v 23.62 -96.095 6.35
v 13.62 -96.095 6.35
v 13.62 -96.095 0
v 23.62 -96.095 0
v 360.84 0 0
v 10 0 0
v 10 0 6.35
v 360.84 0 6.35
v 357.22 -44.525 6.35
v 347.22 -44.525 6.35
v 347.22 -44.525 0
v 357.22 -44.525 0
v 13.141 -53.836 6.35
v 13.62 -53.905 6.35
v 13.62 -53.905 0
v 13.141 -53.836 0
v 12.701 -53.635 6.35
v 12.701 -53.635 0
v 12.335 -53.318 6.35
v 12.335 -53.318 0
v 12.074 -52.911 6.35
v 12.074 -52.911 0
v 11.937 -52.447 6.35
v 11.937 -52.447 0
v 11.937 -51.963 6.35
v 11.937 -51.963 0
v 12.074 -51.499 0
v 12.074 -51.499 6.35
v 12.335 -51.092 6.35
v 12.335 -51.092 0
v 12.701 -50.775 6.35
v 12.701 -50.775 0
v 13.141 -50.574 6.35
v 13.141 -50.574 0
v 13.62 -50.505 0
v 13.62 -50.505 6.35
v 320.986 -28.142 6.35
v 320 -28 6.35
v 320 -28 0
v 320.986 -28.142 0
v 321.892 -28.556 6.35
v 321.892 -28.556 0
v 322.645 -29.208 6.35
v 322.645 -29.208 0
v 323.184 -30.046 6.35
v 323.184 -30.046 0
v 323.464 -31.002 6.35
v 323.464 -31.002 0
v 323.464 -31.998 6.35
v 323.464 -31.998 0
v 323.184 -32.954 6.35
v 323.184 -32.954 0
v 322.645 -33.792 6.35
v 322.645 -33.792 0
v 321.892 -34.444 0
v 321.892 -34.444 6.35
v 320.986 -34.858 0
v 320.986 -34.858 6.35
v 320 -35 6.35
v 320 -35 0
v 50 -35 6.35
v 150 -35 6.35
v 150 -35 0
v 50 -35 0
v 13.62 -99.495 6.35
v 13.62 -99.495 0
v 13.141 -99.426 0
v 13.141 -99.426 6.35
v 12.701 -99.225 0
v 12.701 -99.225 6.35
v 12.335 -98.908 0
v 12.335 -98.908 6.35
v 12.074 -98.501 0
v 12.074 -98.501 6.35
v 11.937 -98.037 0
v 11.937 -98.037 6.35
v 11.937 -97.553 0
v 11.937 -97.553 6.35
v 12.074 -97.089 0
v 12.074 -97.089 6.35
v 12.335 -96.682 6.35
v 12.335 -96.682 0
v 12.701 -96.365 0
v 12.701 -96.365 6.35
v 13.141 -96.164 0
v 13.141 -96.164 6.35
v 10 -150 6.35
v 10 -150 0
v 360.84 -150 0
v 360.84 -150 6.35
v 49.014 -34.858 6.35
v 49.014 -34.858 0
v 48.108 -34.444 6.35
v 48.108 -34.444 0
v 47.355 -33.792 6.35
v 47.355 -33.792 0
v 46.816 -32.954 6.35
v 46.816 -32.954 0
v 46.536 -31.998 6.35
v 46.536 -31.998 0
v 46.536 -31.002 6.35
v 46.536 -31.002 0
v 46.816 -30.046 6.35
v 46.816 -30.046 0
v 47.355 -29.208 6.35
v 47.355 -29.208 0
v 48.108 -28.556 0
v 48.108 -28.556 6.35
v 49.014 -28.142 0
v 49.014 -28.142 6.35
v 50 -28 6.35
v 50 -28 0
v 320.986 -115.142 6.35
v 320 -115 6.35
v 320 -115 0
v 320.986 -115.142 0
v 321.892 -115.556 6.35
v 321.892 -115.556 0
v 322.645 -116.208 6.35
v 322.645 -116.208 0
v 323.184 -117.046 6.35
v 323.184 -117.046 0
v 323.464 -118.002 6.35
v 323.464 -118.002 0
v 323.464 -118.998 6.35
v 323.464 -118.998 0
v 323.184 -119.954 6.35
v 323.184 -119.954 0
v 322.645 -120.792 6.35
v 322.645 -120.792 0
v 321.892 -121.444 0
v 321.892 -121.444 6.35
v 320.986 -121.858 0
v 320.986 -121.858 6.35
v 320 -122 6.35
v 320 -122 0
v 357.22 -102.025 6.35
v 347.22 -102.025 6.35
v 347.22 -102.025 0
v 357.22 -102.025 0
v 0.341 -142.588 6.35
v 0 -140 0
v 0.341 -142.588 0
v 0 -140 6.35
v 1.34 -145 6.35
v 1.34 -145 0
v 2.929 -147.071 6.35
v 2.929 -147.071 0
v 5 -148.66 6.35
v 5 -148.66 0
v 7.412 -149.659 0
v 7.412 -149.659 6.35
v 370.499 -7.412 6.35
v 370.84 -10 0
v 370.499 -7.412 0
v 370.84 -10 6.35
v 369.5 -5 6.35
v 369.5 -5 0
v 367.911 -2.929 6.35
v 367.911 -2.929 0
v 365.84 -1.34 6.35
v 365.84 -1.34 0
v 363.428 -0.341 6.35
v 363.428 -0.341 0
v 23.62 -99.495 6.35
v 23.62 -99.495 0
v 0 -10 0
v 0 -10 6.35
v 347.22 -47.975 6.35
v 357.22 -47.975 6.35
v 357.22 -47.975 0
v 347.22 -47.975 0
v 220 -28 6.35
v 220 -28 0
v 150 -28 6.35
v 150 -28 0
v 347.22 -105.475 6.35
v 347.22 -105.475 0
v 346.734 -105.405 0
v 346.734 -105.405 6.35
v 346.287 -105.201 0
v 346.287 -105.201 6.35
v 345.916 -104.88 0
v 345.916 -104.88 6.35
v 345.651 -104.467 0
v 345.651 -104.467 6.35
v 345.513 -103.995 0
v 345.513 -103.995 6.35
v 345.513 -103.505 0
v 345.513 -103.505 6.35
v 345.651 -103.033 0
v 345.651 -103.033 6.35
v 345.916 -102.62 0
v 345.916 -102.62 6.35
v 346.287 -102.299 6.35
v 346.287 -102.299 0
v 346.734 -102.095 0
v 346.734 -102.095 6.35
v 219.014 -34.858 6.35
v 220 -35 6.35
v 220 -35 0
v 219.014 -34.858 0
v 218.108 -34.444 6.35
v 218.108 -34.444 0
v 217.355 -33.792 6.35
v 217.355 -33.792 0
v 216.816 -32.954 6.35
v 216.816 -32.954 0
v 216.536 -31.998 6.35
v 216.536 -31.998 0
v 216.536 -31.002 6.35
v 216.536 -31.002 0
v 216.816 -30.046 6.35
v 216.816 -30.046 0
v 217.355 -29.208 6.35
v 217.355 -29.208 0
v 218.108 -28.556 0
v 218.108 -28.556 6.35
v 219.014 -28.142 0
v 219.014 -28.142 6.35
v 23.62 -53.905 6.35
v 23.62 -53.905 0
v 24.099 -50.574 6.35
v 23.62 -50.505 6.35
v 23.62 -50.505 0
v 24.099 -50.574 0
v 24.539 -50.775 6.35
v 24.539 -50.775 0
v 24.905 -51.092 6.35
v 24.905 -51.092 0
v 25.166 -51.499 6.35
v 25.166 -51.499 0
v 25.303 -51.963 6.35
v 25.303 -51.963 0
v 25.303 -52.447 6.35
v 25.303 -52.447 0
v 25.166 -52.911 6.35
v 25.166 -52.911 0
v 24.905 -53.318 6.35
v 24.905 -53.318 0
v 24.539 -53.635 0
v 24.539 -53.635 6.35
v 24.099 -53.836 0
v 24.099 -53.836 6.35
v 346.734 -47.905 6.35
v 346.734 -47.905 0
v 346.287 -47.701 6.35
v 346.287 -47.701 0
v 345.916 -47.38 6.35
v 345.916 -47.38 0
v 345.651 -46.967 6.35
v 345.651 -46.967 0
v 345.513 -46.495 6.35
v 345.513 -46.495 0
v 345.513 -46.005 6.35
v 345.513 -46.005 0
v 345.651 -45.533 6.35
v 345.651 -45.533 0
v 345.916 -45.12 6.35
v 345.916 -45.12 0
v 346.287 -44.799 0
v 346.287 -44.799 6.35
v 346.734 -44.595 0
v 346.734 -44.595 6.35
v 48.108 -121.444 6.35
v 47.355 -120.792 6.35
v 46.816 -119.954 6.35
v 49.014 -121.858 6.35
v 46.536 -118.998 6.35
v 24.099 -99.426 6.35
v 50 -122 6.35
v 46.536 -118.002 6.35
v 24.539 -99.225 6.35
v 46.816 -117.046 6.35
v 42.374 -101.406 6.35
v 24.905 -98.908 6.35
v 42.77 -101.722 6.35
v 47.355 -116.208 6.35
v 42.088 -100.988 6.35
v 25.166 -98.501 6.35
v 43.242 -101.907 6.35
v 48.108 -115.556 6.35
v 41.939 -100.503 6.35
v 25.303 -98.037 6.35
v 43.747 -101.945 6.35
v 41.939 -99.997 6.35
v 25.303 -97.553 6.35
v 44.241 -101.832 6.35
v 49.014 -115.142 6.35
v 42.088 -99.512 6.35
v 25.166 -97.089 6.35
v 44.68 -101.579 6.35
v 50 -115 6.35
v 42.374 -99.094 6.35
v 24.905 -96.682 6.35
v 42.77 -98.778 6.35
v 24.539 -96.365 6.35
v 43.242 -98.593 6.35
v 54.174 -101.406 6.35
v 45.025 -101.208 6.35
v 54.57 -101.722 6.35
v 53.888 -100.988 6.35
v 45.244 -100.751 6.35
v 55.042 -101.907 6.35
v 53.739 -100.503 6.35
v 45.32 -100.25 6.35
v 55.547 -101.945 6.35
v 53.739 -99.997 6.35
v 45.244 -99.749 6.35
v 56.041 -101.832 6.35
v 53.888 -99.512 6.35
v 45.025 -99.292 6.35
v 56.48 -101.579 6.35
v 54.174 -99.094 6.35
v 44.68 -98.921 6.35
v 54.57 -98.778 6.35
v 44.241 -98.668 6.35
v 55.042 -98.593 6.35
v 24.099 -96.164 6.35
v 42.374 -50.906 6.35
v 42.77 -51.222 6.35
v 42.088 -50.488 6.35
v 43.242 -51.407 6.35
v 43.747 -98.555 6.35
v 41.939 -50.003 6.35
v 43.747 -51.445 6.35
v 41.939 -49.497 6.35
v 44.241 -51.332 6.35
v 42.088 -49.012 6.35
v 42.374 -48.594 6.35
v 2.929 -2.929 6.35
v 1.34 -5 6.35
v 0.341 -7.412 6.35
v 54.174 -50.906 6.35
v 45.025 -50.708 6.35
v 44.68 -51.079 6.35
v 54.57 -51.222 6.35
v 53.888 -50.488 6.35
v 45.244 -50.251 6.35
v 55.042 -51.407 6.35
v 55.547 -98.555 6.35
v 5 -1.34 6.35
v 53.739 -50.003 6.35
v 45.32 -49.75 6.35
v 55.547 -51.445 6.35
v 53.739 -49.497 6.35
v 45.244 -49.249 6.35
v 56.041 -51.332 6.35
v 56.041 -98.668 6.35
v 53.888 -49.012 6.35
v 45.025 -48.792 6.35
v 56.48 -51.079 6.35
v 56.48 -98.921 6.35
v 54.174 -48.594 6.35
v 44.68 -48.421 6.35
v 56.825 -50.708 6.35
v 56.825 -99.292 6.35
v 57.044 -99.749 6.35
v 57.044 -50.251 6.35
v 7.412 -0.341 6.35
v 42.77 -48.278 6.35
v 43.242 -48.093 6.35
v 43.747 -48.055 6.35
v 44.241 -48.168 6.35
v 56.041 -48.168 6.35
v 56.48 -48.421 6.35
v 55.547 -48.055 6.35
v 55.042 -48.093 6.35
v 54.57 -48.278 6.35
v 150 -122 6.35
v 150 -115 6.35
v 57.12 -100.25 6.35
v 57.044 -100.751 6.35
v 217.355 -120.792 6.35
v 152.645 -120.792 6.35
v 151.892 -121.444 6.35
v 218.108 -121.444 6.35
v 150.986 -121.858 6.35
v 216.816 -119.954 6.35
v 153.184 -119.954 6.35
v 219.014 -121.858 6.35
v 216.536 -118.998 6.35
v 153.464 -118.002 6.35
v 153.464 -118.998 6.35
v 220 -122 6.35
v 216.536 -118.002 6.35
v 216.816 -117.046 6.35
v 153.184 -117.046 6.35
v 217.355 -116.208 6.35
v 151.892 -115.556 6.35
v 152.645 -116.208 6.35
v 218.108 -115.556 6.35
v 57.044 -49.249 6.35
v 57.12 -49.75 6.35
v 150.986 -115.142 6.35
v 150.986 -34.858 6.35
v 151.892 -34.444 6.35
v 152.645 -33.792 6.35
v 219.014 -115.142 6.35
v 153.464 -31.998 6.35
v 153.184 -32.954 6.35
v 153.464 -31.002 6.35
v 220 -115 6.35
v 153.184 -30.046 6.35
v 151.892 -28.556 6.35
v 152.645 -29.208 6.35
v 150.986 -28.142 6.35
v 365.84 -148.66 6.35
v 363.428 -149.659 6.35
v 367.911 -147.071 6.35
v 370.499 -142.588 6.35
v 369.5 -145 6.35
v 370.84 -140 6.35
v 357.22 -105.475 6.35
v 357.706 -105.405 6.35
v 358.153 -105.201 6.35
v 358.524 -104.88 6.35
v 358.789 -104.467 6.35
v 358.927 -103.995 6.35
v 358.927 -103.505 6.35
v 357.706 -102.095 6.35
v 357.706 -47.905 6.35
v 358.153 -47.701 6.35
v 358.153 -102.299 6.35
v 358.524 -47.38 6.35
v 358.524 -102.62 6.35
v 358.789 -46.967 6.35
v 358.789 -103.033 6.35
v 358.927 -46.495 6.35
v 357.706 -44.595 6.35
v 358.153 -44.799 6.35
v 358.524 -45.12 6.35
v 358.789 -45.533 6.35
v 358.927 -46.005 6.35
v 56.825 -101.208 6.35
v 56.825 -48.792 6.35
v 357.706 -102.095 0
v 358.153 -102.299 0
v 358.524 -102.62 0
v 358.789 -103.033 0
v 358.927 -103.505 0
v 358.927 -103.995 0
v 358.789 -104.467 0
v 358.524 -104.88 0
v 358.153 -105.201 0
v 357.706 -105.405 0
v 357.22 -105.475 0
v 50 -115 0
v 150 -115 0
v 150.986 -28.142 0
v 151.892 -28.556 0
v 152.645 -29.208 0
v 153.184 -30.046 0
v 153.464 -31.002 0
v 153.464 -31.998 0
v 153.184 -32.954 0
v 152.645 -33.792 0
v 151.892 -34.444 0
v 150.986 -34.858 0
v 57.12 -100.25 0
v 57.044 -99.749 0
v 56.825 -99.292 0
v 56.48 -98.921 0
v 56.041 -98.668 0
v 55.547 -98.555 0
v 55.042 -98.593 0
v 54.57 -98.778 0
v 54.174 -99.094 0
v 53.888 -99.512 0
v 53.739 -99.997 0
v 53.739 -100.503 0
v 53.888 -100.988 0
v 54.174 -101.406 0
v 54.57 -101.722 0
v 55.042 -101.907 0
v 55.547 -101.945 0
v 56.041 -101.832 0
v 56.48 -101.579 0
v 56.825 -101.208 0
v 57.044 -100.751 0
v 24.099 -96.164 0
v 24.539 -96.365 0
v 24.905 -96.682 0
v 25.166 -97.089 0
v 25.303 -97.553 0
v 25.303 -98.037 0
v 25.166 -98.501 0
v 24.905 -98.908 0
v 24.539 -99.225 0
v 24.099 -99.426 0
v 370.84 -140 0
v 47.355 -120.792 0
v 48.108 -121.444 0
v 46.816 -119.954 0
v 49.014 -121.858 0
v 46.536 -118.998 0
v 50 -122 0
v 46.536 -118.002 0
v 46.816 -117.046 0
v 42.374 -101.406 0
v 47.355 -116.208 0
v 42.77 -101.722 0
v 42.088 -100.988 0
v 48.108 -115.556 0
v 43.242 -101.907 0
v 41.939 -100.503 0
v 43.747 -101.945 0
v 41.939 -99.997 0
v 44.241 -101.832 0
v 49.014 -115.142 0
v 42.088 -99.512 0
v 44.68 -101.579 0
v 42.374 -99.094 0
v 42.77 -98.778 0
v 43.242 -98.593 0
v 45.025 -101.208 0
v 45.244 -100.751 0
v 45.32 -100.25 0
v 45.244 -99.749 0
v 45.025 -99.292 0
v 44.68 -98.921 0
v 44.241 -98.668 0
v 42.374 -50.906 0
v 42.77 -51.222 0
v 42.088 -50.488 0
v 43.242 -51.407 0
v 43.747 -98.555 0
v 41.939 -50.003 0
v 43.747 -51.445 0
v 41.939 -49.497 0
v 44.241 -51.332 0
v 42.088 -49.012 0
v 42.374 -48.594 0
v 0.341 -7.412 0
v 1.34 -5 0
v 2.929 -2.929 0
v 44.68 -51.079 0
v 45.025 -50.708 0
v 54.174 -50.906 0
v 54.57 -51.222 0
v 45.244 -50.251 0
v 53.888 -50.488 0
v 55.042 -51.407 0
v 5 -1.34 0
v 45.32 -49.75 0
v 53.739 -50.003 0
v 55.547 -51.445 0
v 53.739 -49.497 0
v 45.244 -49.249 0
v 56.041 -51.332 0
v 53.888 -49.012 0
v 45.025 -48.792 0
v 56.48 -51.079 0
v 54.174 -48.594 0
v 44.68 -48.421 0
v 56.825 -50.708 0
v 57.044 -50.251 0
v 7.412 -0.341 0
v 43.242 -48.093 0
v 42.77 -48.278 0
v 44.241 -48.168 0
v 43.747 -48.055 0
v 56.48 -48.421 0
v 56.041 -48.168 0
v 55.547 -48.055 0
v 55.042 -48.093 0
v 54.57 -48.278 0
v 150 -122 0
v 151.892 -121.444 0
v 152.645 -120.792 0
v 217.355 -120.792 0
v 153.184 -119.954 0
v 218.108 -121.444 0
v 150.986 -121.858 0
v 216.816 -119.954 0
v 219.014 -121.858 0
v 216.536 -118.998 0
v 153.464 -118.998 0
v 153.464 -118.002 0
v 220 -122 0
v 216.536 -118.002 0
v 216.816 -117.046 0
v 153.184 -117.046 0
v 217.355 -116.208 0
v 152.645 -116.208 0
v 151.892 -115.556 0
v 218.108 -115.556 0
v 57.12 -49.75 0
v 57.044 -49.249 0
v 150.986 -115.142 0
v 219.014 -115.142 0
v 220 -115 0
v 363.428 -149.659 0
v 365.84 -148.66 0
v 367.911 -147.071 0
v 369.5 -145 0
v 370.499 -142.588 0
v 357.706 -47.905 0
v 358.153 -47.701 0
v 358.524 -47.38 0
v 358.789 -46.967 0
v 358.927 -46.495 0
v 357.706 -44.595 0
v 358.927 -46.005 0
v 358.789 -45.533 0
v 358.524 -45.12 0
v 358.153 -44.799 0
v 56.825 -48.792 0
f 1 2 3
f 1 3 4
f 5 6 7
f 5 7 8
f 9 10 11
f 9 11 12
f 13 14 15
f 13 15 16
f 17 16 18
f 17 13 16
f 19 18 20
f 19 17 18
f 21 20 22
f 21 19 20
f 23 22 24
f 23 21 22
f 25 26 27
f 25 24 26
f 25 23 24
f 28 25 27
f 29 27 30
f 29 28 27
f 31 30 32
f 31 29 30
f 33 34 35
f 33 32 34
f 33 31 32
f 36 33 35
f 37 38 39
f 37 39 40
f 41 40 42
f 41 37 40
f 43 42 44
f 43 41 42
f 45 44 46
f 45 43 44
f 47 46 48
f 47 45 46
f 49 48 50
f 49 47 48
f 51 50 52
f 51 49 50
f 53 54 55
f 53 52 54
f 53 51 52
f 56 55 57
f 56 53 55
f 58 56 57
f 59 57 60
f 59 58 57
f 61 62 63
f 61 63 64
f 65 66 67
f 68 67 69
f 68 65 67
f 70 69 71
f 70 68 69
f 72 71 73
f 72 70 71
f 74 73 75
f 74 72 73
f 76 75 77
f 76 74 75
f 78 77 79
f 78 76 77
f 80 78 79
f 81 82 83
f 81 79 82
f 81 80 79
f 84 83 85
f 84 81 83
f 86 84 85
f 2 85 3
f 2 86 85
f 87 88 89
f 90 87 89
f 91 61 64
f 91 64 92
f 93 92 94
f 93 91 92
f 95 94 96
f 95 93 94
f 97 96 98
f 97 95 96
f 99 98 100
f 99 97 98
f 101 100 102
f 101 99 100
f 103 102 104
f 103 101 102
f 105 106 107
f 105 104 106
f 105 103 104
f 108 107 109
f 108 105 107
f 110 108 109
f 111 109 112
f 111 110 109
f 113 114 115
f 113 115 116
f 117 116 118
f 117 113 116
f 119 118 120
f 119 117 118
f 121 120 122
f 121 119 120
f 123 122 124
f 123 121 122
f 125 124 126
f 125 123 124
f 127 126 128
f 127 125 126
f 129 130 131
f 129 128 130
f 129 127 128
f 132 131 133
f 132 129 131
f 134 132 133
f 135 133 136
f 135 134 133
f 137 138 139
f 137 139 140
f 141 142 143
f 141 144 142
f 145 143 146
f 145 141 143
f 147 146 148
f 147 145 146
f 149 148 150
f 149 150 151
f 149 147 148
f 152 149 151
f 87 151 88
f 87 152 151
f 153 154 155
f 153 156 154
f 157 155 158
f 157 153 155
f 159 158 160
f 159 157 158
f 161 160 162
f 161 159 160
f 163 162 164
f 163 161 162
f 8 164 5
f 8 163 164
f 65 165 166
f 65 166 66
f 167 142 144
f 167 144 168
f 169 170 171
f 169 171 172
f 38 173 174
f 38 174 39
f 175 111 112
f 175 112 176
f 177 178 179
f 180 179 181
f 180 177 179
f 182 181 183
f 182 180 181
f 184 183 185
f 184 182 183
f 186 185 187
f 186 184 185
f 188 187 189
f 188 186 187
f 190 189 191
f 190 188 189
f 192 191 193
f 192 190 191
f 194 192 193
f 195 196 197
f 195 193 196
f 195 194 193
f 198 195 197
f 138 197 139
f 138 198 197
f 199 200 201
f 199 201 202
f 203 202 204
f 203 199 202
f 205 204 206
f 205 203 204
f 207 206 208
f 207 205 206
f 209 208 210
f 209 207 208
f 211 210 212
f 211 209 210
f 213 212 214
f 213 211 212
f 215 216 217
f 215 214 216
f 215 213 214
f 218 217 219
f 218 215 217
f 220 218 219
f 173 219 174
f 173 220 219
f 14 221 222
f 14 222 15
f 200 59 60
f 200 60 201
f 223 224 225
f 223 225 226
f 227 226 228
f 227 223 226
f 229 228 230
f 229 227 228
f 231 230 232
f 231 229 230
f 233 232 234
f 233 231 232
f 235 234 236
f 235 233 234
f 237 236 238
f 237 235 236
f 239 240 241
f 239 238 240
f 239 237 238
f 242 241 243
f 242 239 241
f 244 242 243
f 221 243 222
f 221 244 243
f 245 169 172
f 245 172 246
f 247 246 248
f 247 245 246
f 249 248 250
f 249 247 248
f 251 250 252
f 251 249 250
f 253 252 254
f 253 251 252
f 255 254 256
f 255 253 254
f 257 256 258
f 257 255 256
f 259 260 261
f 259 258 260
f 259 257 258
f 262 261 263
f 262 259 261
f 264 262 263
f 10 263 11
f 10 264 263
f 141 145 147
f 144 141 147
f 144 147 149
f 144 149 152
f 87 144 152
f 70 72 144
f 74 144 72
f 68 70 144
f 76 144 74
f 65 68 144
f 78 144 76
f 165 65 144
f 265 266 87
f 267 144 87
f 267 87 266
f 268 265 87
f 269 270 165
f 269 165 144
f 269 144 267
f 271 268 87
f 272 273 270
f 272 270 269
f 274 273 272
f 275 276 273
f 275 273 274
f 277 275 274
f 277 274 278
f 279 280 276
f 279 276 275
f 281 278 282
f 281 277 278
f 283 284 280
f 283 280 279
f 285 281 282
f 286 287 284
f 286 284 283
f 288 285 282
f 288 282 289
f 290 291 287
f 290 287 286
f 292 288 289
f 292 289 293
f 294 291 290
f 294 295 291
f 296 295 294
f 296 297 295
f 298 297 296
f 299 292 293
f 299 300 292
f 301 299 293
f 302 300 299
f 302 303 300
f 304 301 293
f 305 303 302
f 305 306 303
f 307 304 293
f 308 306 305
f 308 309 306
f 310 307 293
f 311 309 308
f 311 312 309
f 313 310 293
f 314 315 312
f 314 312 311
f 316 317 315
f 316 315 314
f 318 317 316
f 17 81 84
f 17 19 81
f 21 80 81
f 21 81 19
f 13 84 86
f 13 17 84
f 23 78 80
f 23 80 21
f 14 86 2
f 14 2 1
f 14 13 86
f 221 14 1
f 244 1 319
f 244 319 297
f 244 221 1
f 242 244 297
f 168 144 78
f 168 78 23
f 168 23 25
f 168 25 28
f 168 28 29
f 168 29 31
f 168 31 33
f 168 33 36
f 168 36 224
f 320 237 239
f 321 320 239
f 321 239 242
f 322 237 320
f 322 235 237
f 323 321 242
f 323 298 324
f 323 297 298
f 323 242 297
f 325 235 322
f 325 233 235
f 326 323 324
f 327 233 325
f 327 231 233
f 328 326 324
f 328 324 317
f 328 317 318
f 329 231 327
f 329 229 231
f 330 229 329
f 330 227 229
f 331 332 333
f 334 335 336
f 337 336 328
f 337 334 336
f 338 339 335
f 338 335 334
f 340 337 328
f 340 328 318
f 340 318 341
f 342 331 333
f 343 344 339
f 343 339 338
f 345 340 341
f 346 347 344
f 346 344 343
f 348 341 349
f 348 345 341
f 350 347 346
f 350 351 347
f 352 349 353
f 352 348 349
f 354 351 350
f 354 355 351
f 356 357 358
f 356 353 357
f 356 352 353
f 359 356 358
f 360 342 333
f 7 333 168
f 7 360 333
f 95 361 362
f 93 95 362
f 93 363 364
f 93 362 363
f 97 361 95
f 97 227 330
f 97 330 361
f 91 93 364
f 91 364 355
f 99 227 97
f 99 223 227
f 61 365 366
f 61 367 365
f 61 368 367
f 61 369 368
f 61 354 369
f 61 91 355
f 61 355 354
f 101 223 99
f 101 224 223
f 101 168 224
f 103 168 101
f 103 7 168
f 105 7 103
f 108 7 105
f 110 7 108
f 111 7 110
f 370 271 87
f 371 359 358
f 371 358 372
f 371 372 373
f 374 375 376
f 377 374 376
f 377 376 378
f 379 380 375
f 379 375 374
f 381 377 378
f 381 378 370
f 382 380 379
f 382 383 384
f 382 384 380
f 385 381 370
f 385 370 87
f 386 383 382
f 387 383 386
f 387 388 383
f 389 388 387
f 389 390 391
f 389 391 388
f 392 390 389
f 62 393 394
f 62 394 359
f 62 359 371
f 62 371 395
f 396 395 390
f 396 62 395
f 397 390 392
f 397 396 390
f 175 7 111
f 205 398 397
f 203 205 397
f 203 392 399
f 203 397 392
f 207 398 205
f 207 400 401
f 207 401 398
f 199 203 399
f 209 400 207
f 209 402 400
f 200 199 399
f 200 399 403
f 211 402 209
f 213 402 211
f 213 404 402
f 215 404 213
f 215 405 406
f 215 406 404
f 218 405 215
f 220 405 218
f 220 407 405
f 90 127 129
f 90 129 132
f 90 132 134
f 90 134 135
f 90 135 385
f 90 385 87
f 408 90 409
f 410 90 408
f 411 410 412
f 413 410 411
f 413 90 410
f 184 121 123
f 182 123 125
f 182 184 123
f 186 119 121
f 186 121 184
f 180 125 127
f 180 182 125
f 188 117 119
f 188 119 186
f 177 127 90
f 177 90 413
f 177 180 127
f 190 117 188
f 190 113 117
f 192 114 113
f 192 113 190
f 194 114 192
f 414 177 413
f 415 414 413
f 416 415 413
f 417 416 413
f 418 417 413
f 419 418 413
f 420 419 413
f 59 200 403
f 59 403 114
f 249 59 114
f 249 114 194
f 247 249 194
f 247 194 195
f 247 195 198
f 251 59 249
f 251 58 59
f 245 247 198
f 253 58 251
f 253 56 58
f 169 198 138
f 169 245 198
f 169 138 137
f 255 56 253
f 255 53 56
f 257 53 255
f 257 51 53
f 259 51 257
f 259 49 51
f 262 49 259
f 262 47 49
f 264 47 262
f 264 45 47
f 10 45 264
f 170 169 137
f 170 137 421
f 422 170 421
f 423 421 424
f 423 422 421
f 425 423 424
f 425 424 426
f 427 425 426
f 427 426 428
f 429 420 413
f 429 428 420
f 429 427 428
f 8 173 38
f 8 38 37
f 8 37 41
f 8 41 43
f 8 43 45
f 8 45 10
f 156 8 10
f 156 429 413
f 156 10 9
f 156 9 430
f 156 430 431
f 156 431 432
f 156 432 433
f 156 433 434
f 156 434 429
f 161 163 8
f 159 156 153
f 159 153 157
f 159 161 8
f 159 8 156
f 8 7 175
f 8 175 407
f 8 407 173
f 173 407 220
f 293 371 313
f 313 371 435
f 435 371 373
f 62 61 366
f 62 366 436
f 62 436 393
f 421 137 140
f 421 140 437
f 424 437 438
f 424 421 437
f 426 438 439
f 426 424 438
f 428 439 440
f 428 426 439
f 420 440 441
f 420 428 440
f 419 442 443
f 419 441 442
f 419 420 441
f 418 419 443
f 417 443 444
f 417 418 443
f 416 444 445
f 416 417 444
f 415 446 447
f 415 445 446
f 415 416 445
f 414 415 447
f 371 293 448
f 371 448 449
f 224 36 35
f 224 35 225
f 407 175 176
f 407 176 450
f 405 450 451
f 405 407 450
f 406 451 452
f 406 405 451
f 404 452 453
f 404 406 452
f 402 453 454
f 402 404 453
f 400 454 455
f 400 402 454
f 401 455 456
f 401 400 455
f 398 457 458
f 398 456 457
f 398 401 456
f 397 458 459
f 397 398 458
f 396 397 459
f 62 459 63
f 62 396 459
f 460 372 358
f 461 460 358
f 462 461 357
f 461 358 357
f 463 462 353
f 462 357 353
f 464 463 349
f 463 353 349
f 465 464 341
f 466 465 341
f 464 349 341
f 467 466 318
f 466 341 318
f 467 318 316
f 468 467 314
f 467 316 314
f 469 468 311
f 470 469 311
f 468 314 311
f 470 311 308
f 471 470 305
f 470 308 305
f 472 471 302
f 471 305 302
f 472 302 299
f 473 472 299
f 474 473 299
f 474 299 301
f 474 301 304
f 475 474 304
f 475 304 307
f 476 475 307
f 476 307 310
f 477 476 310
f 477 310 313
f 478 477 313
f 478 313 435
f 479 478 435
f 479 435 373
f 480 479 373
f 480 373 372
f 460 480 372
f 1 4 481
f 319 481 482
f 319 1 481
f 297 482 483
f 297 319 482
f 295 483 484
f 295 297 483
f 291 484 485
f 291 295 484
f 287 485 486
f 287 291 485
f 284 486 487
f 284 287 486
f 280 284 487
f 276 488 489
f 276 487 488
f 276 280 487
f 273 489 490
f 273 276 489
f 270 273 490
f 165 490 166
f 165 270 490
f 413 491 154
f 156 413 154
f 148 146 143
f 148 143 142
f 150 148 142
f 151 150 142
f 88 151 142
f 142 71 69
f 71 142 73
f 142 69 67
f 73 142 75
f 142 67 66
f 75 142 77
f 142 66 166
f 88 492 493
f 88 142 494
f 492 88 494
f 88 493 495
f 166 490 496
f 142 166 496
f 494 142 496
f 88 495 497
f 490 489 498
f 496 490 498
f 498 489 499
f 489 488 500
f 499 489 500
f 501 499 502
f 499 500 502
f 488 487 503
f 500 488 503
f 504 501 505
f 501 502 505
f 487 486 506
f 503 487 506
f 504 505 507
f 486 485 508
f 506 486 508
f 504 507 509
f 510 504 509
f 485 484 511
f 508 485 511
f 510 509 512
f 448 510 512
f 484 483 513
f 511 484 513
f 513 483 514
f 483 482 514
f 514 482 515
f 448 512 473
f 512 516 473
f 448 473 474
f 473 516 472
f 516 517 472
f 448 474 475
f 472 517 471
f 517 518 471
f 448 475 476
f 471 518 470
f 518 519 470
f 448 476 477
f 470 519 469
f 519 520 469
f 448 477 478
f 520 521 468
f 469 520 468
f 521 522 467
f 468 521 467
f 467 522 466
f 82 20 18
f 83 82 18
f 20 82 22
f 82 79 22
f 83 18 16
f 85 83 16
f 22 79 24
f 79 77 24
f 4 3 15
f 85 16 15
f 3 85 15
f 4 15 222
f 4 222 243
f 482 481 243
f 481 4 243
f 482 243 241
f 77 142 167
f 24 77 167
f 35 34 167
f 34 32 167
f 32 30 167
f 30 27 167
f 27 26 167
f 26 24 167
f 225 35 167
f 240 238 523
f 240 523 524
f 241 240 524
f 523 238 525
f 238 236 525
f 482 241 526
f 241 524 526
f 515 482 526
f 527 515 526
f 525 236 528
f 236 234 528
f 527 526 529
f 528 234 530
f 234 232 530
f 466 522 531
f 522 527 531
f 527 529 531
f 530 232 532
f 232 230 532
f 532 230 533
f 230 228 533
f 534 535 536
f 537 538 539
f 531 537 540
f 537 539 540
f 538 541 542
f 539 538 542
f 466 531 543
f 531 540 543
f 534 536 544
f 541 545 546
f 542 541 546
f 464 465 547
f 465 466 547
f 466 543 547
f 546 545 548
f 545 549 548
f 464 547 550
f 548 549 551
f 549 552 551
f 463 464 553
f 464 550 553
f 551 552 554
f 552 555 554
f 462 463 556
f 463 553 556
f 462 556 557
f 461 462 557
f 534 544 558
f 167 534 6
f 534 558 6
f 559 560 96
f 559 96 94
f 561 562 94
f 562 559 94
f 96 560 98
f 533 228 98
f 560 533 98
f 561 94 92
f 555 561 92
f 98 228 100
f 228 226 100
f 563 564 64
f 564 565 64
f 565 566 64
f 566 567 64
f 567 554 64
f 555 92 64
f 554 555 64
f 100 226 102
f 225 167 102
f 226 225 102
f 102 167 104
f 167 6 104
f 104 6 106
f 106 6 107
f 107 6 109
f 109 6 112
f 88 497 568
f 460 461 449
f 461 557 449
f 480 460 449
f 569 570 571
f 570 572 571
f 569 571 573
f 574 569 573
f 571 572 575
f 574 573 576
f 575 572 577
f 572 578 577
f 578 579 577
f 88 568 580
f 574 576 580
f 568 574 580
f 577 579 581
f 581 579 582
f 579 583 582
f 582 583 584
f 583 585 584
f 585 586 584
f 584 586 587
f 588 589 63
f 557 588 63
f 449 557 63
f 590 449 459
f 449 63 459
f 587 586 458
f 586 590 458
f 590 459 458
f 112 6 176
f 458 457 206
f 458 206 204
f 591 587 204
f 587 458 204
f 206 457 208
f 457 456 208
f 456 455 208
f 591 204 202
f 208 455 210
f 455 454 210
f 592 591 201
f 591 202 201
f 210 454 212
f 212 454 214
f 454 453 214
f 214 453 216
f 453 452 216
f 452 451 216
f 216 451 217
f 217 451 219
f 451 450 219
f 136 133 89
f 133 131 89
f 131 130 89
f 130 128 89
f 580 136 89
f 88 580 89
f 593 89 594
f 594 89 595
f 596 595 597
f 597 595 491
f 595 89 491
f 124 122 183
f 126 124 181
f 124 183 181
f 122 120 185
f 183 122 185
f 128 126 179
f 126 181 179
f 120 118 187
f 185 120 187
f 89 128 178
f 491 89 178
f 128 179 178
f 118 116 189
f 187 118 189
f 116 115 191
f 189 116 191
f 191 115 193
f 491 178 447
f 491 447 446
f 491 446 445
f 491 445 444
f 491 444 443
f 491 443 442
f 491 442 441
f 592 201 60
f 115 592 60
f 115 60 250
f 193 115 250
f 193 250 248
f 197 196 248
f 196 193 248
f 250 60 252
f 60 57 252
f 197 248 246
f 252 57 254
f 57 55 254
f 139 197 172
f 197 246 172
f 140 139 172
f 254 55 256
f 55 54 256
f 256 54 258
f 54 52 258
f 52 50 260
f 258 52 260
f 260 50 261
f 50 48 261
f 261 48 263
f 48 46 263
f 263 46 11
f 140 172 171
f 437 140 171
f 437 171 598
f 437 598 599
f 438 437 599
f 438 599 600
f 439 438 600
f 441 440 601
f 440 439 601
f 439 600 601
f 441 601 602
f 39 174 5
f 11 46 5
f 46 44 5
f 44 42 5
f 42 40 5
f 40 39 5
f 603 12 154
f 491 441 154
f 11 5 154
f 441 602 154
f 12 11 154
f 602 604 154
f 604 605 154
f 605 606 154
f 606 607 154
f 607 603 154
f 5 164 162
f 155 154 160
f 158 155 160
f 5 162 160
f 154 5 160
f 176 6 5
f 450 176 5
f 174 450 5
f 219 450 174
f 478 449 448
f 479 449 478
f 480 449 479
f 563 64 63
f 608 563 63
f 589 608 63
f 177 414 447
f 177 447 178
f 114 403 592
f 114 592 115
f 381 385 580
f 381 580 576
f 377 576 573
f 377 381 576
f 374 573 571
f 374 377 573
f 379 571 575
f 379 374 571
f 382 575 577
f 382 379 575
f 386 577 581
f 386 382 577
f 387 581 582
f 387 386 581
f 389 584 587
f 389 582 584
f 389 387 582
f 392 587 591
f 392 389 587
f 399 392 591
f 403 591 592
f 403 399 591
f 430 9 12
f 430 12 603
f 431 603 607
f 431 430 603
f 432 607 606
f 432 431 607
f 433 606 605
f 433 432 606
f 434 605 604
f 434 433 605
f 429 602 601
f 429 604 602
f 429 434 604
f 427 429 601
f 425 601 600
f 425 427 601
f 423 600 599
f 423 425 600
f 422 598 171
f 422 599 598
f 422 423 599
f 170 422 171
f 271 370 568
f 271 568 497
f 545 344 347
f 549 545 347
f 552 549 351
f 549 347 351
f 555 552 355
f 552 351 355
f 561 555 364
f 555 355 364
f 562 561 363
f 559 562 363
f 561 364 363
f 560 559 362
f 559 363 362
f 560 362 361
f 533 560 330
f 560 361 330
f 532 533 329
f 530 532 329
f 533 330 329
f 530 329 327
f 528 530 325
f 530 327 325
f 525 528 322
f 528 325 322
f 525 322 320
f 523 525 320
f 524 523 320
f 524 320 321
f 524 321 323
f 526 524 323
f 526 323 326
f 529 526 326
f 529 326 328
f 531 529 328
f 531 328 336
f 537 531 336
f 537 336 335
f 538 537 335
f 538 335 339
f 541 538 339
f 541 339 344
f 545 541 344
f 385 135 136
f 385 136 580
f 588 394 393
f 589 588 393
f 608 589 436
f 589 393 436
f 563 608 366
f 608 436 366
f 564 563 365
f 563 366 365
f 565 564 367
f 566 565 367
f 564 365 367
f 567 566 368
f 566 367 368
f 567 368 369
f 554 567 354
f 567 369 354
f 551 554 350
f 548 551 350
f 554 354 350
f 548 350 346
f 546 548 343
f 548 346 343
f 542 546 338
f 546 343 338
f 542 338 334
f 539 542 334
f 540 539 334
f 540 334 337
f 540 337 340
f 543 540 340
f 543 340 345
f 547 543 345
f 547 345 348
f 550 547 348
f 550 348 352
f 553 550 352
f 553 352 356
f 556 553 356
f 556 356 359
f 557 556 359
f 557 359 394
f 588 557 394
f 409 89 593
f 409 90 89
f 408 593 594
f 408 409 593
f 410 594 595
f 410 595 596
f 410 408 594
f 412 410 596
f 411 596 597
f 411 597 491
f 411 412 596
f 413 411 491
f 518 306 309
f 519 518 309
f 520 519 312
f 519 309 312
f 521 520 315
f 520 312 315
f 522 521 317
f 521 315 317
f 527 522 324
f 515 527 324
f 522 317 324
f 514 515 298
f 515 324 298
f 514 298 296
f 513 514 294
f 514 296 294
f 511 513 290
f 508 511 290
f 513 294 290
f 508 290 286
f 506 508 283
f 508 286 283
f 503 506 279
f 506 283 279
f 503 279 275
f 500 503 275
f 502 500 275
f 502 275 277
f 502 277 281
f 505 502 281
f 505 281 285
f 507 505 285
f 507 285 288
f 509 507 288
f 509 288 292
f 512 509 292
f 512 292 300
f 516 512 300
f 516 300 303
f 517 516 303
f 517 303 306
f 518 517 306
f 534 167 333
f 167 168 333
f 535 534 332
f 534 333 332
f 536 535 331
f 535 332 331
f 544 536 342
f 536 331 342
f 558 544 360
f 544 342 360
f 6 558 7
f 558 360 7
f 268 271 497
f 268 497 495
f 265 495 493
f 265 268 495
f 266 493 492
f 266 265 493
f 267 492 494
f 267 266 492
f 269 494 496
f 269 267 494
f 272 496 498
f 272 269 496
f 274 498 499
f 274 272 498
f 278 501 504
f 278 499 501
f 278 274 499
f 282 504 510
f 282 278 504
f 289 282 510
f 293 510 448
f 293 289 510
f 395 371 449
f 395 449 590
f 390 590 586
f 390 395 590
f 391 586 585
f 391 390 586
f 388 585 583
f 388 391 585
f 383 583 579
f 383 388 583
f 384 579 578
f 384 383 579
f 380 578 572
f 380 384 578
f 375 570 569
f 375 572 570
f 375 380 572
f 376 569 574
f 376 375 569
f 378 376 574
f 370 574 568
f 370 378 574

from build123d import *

# Parameters (mm, degrees)
SKETCH1_W           = 370.84
SKETCH1_H           = 150
BOSS_EXTRUDE1_DEPTH = 6.35
FILLET3_R           = 10
FILLET4_R           = 10
FILLET5_R           = 10
FILLET6_R           = 10
SKETCH3_R           = 1.7
CUT_EXTRUDE1_DEPTH  = 10
CUT_EXTRUDE2_DEPTH  = 10
SKETCH6_R           = 1.7
CUT_EXTRUDE3_DEPTH  = 7.35


with BuildPart() as part:
    # Sketch1 → Boss-Extrude1 (new body)
    with BuildSketch(Plane.XY):
        with Locations((185.42, -75)):
            Rectangle(SKETCH1_W, SKETCH1_H)
    extrude(amount=BOSS_EXTRUDE1_DEPTH)

    # Fillet3
    fillet3_edges = [part.edges().sort_by_distance(p)[0] for p in [
        (0, 0, 3.175),
    ]]
    fillet(fillet3_edges, radius=FILLET3_R)

    # Fillet4
    fillet4_edges = [part.edges().sort_by_distance(p)[0] for p in [
        (0, -150, 3.175),
    ]]
    fillet(fillet4_edges, radius=FILLET4_R)

    # Fillet5
    fillet5_edges = [part.edges().sort_by_distance(p)[0] for p in [
        (370.84, -150, 3.175),
    ]]
    fillet(fillet5_edges, radius=FILLET5_R)

    # Fillet6
    fillet6_edges = [part.edges().sort_by_distance(p)[0] for p in [
        (370.84, 0, 3.175),
    ]]
    fillet(fillet6_edges, radius=FILLET6_R)

    # Sketch3 → Cut-Extrude1 (cut)
    with BuildSketch(Plane.XY.offset(6.35)):
        with Locations((18.62, -52.205)):
            Circle(SKETCH3_R)
        with Locations((18.62, -97.795)):
            Circle(SKETCH3_R)
        with Locations((352.22, -103.75)):
            Circle(SKETCH3_R)
        with Locations((352.22, -46.25)):
            Circle(SKETCH3_R)
    extrude(amount=-CUT_EXTRUDE1_DEPTH, mode=Mode.SUBTRACT)

    # Sketch4 → Cut-Extrude2 (cut)
    with BuildSketch(Plane.XY.offset(6.35)):
        with BuildLine():
            Line((50, -28), (150, -28))
            ThreePointArc((150, -28), (153.5, -31.5), (150, -35))
            Line((150, -35), (50, -35))
            ThreePointArc((50, -35), (46.5, -31.5), (50, -28))
        make_face()
        with BuildLine():
            Line((220, -28), (320, -28))
            ThreePointArc((320, -28), (323.5, -31.5), (320, -35))
            Line((320, -35), (220, -35))
            ThreePointArc((220, -35), (216.5, -31.5), (220, -28))
        make_face()
        with BuildLine():
            Line((50, -115), (150, -115))
            ThreePointArc((150, -115), (153.5, -118.5), (150, -122))
            Line((150, -122), (50, -122))
            ThreePointArc((50, -122), (46.5, -118.5), (50, -115))
        make_face()
        with BuildLine():
            Line((220, -115), (320, -115))
            ThreePointArc((320, -115), (323.5, -118.5), (320, -122))
            Line((320, -122), (220, -122))
            ThreePointArc((220, -122), (216.5, -118.5), (220, -115))
        make_face()
    extrude(amount=-CUT_EXTRUDE2_DEPTH, mode=Mode.SUBTRACT)

    # Sketch6 → Cut-Extrude3 (cut, through all)
    with BuildSketch(Plane.XY.offset(6.35)):
        with Locations((43.62, -49.75)):
            Circle(SKETCH6_R)
        with Locations((43.62, -100.25)):
            Circle(SKETCH6_R)
        with Locations((55.42, -49.75)):
            Circle(SKETCH6_R)
        with Locations((55.42, -100.25)):
            Circle(SKETCH6_R)
        with BuildLine():
            Line((13.62, -50.505), (23.62, -50.505))
            ThreePointArc((23.62, -50.505), (25.32, -52.205), (23.62, -53.905))
            Line((23.62, -53.905), (13.62, -53.905))
            ThreePointArc((13.62, -53.905), (11.92, -52.205), (13.62, -50.505))
        make_face()
        with BuildLine():
            Line((13.62, -96.095), (23.62, -96.095))
            ThreePointArc((23.62, -96.095), (25.32, -97.795), (23.62, -99.495))
            Line((23.62, -99.495), (13.62, -99.495))
            ThreePointArc((13.62, -99.495), (11.92, -97.795), (13.62, -96.095))
        make_face()
        with BuildLine():
            Line((347.22, -44.525), (357.22, -44.525))
            ThreePointArc((357.22, -44.525), (358.945, -46.25), (357.22, -47.975))
            Line((357.22, -47.975), (347.22, -47.975))
            ThreePointArc((347.22, -47.975), (345.495, -46.25), (347.22, -44.525))
        make_face()
        with BuildLine():
            Line((347.22, -102.025), (357.22, -102.025))
            ThreePointArc((357.22, -102.025), (358.945, -103.75), (357.22, -105.475))
            Line((357.22, -105.475), (347.22, -105.475))
            ThreePointArc((347.22, -105.475), (345.495, -103.75), (347.22, -102.025))
        make_face()
    extrude(amount=-CUT_EXTRUDE3_DEPTH, mode=Mode.SUBTRACT)


solid = part.part
